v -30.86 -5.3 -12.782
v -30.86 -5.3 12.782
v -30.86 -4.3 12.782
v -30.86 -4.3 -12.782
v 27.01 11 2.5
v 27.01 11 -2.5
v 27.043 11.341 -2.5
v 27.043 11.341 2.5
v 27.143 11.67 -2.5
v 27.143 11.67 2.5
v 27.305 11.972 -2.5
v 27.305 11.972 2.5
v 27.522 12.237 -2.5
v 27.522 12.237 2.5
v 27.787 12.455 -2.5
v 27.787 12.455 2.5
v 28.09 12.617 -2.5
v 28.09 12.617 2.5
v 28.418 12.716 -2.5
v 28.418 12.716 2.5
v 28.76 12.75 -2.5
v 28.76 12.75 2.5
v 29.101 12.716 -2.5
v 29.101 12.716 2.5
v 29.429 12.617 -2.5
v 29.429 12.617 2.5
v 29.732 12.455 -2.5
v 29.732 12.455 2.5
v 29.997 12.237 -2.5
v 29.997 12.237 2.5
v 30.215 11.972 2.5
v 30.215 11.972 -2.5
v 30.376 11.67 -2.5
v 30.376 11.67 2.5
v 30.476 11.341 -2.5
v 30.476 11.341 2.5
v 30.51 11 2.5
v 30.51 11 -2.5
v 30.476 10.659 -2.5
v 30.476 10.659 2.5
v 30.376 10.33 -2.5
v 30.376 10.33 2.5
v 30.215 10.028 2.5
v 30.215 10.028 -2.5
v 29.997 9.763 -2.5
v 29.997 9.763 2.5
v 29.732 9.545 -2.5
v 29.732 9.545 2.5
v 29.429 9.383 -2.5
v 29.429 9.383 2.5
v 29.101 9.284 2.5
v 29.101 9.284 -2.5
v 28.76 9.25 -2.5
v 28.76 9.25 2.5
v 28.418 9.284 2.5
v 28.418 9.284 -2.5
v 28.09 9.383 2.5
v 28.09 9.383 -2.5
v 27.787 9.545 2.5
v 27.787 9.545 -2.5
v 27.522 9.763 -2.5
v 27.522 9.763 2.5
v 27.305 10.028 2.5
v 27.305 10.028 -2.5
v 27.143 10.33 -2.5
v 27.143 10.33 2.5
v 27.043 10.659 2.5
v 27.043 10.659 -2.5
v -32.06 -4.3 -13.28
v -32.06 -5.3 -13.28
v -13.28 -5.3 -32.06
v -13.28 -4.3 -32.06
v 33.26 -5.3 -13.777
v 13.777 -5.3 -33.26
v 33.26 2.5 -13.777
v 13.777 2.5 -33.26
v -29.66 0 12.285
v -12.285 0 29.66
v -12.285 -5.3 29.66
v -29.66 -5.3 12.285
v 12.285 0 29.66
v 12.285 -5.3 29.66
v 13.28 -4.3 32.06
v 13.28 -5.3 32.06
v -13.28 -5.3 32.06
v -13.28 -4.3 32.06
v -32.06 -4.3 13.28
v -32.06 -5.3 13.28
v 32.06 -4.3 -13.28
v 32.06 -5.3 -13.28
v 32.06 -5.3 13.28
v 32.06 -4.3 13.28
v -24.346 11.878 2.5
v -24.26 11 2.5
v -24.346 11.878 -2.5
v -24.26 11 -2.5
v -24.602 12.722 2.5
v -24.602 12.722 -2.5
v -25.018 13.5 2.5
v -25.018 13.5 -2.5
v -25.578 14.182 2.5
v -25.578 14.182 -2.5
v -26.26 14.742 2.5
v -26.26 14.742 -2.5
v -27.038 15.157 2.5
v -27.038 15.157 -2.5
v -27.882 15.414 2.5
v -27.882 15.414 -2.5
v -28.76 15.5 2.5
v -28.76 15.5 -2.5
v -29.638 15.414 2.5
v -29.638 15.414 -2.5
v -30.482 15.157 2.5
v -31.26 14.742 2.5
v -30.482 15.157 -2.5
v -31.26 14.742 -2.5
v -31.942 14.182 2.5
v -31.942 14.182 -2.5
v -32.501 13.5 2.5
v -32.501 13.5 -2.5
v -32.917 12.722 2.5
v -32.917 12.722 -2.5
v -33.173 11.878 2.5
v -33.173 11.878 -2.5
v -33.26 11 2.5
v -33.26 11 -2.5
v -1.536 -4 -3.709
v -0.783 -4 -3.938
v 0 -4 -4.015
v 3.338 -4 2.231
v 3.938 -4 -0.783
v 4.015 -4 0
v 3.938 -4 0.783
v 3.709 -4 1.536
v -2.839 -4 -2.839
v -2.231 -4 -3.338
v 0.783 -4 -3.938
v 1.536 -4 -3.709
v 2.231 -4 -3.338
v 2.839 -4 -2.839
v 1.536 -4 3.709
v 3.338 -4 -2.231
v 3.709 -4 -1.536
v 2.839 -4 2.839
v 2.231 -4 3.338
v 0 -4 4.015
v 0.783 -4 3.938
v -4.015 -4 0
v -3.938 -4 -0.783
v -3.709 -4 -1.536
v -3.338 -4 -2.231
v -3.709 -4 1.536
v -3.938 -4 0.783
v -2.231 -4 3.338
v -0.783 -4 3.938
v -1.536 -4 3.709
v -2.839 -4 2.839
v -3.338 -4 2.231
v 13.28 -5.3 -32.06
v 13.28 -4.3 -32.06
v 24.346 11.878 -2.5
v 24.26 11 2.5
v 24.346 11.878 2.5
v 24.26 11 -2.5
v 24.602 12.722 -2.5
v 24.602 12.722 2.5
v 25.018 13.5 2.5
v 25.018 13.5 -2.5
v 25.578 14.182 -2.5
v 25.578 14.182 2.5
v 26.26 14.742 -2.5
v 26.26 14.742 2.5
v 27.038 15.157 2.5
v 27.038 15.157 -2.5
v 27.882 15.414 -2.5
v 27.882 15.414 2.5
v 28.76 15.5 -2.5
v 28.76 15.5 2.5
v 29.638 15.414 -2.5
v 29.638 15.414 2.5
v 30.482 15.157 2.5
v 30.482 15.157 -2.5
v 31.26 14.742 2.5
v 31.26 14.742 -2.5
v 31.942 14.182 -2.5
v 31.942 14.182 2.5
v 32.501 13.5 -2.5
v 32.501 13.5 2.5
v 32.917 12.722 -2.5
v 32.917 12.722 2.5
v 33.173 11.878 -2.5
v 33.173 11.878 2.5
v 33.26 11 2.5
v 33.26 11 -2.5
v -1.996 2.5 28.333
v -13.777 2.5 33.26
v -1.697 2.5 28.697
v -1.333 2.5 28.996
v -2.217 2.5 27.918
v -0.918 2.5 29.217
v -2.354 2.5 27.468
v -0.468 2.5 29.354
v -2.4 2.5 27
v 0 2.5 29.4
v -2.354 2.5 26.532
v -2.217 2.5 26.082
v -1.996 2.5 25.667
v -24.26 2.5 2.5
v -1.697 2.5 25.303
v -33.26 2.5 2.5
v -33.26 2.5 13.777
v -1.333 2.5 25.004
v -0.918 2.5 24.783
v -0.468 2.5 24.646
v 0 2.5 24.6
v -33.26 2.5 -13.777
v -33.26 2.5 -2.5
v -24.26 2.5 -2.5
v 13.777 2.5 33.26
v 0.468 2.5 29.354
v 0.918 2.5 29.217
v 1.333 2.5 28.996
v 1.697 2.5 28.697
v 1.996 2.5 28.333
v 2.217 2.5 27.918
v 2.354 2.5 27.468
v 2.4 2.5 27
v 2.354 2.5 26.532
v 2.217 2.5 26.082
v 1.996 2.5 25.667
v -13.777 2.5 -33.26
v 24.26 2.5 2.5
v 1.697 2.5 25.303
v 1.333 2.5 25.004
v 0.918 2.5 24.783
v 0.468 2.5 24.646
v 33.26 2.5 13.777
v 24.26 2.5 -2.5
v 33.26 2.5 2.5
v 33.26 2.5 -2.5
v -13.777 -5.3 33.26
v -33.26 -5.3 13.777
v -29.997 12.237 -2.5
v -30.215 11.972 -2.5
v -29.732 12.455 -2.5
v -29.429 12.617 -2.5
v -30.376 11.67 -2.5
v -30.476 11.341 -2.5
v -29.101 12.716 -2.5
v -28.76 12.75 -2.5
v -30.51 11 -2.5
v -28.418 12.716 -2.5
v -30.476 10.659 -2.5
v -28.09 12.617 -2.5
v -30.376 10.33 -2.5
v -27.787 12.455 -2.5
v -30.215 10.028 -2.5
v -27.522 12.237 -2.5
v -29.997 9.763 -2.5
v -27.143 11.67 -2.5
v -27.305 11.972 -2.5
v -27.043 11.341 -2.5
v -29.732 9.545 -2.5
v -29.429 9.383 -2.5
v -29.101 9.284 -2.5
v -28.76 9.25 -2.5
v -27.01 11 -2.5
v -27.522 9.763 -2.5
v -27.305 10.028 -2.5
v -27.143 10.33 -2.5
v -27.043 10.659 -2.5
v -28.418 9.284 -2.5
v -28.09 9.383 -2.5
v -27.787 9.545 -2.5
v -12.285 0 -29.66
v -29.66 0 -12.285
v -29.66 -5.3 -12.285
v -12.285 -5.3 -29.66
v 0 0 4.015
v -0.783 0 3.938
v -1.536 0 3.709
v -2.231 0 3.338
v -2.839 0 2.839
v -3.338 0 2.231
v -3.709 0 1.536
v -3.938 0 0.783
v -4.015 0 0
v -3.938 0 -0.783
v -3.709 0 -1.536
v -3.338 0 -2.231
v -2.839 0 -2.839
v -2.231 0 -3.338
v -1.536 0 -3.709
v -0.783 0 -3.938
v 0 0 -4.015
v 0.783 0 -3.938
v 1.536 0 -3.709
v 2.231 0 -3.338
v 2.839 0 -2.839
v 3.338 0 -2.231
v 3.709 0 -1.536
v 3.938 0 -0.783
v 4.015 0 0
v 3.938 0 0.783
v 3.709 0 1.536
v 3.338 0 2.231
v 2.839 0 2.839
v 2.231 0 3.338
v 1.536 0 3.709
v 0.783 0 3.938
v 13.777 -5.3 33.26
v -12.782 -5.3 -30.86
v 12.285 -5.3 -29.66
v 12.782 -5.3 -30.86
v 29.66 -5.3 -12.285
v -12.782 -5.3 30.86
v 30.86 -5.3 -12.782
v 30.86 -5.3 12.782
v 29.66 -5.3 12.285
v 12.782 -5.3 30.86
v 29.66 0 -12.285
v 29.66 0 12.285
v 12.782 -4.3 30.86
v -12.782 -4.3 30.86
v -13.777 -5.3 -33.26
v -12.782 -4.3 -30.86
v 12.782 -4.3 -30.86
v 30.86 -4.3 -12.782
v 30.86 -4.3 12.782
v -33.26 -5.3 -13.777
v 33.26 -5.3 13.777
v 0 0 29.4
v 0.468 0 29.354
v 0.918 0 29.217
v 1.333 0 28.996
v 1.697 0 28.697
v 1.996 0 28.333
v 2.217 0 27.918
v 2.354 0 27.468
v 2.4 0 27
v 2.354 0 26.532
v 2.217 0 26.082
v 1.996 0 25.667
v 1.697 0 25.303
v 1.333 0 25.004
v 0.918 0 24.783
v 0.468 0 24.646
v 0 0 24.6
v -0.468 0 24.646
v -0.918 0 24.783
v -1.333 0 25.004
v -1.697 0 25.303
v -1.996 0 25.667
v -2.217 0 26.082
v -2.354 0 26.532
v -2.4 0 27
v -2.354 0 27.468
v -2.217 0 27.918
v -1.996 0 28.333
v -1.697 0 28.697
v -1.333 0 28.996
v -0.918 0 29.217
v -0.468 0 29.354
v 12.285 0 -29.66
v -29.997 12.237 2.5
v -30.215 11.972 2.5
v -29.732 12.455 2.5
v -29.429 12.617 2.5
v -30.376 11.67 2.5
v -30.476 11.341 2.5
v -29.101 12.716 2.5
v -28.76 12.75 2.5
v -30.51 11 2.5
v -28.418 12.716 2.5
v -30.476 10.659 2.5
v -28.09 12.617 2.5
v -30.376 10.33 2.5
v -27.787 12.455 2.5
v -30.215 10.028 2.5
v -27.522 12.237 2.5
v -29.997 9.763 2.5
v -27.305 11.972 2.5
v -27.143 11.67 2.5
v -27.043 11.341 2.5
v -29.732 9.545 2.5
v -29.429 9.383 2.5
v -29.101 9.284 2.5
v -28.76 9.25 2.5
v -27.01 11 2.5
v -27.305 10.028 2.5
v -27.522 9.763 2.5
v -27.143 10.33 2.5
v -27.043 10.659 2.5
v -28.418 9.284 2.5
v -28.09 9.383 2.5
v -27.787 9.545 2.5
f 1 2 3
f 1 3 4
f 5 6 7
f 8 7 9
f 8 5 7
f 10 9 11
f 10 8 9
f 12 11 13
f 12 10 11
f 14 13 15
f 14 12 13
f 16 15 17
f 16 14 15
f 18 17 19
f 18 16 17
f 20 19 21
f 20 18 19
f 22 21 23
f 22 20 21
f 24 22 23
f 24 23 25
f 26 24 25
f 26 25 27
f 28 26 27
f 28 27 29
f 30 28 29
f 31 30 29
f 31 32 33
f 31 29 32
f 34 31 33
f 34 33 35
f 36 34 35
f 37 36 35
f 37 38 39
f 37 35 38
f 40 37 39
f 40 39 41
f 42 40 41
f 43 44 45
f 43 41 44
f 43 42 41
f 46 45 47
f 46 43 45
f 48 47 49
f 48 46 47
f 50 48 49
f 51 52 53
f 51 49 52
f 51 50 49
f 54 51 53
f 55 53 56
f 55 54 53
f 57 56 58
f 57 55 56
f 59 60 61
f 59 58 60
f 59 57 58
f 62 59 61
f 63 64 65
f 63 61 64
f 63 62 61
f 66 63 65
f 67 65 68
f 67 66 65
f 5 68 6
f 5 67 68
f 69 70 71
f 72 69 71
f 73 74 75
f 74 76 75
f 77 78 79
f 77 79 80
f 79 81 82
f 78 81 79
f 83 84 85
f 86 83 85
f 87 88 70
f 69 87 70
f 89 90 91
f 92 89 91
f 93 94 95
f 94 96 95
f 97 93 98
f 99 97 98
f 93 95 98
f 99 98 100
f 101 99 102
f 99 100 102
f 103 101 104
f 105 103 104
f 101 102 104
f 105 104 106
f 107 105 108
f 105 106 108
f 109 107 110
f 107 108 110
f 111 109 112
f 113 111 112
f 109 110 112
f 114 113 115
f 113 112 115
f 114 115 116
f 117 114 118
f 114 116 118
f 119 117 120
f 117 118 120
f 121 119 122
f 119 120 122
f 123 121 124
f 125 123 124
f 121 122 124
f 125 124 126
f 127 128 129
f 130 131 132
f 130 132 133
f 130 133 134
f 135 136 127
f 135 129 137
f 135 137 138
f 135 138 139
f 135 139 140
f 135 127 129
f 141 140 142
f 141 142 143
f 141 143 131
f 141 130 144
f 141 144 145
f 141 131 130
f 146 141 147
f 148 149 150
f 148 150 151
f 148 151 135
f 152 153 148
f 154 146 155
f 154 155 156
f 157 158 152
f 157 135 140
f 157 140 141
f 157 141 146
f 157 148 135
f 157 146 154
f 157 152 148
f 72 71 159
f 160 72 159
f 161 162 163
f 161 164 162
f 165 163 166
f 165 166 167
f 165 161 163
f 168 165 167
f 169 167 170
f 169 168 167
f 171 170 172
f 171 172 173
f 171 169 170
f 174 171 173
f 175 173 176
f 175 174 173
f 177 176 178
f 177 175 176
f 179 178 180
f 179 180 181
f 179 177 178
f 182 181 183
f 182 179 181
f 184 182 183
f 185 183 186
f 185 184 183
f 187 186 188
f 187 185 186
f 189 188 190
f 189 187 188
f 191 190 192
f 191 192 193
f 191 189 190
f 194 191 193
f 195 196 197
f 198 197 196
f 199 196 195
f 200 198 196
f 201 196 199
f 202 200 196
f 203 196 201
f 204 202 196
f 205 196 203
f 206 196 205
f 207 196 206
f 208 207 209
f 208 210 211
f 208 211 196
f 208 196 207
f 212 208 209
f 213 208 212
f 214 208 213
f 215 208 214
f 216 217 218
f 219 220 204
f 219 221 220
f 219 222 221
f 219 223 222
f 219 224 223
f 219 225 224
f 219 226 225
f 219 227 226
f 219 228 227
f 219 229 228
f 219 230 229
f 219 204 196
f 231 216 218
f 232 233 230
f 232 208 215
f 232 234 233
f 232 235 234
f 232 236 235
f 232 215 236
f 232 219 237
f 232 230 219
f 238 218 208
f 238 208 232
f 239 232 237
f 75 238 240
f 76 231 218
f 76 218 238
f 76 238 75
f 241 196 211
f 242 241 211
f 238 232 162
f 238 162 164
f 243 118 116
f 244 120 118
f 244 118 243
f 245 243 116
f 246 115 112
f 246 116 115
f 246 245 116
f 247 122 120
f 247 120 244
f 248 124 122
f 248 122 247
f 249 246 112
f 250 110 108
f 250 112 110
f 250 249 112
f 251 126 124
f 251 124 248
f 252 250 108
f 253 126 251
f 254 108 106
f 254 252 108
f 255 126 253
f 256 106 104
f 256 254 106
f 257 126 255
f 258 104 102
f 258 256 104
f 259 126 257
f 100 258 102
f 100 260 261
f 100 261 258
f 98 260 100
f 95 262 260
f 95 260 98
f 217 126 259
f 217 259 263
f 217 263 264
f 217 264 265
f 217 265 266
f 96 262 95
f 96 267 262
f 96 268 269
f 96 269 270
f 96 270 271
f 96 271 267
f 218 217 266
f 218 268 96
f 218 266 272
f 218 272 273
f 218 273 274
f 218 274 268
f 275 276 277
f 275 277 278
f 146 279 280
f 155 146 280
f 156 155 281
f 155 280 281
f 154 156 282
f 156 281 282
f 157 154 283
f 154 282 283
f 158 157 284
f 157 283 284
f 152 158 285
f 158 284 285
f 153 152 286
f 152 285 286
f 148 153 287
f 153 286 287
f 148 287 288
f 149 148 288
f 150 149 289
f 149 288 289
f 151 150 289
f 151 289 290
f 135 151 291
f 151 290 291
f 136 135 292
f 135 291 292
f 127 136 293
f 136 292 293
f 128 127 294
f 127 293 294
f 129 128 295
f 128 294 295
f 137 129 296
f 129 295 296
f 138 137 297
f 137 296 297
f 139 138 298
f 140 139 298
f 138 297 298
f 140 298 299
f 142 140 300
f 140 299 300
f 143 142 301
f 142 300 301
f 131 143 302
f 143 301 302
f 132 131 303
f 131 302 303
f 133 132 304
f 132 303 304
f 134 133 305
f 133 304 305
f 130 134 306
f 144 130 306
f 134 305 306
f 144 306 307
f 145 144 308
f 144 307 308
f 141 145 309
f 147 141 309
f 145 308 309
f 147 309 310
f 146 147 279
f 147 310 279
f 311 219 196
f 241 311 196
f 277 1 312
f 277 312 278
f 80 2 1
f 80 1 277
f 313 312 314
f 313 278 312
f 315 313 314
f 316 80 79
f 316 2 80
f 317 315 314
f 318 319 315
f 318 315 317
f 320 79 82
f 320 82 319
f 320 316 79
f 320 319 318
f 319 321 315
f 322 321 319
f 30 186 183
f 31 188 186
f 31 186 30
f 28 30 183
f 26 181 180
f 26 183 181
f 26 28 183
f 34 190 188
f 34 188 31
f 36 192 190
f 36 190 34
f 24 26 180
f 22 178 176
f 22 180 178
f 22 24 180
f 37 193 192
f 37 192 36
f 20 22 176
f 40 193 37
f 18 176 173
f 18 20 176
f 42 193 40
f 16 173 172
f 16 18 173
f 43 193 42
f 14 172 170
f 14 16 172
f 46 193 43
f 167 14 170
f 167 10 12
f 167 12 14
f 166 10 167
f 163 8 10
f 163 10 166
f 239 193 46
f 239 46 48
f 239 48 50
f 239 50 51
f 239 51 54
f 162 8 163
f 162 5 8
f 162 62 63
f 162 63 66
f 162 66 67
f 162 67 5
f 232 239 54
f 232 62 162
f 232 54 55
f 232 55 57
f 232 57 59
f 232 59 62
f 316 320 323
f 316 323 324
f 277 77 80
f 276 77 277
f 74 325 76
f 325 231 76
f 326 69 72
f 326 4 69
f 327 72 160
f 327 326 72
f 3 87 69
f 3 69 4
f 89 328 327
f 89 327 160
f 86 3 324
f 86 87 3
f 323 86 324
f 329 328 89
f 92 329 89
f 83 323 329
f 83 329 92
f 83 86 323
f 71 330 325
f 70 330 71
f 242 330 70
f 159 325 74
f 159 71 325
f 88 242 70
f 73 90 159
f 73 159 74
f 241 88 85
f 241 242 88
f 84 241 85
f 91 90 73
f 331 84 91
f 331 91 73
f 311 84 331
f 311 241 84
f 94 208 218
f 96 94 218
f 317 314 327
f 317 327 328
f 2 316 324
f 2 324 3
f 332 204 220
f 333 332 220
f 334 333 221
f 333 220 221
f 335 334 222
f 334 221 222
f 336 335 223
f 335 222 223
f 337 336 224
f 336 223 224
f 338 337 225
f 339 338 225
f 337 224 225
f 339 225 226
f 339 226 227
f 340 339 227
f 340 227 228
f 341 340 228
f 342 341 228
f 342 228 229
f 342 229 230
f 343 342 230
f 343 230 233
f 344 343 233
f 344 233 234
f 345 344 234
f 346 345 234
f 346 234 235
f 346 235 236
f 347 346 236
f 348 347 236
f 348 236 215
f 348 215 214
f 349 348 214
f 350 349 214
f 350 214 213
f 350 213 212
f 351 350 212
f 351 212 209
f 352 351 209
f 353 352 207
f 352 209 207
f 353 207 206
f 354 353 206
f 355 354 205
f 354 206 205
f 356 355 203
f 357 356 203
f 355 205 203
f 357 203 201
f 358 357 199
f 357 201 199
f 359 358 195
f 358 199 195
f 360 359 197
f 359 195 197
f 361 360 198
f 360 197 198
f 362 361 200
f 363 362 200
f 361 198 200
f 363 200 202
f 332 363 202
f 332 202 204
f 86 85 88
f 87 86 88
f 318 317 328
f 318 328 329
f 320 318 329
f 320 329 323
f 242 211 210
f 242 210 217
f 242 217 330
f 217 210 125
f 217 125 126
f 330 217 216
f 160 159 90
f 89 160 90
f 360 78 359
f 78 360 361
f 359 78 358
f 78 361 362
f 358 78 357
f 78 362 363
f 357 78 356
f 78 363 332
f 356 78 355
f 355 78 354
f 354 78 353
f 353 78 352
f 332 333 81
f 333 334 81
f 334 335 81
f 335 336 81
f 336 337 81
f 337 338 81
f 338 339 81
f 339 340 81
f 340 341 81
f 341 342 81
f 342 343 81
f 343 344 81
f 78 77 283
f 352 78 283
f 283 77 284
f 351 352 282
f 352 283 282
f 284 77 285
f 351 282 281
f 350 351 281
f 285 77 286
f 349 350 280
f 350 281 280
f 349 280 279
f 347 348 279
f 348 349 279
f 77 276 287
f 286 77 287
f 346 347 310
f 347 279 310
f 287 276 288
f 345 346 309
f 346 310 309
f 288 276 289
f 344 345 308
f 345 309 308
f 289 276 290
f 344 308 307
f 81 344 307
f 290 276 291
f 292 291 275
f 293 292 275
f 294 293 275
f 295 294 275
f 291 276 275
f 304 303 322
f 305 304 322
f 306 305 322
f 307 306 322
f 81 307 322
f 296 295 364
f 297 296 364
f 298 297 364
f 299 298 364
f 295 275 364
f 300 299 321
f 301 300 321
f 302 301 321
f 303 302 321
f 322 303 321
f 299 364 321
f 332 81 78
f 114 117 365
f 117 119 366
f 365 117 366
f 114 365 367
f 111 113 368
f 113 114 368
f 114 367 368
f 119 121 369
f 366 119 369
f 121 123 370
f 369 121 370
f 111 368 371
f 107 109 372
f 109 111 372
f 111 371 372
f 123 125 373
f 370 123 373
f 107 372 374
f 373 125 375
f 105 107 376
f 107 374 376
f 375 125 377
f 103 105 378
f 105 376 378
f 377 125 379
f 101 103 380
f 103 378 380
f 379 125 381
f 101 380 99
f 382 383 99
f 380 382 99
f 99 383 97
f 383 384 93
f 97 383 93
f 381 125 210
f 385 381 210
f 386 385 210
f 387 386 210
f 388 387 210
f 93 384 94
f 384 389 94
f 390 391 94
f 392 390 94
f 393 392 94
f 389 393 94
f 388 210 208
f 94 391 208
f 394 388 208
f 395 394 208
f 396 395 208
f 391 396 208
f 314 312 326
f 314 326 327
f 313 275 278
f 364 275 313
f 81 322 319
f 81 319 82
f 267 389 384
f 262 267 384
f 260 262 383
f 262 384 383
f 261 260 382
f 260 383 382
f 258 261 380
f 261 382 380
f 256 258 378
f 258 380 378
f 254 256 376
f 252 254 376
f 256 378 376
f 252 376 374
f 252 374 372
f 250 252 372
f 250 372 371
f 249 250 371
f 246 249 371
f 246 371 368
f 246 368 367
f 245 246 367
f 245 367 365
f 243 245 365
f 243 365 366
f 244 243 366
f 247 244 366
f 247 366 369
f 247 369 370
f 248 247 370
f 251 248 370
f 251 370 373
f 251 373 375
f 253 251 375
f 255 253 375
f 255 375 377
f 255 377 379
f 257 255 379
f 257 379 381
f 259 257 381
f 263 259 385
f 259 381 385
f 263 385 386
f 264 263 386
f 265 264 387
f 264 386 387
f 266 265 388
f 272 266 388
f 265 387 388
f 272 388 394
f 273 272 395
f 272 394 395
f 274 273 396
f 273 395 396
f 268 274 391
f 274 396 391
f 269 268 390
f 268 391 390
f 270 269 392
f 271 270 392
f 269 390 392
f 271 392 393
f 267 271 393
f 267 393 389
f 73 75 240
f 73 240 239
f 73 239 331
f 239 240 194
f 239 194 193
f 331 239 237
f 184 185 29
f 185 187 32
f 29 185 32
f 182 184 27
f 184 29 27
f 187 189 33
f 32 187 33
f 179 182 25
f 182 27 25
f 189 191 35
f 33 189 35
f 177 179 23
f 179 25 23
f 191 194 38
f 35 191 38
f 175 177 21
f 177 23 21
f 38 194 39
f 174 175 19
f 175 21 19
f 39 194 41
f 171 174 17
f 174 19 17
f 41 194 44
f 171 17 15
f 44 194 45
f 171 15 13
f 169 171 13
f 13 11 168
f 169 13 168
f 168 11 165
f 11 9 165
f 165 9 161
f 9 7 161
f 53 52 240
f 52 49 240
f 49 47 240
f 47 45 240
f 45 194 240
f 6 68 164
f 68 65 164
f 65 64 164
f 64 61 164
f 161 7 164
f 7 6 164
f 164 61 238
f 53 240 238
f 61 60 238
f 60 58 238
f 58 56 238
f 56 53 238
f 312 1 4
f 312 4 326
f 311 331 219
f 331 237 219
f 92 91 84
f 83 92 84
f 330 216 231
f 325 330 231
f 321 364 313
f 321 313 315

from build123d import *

# Parameters (mm, degrees)
EXTRUDE_1_DEPTH     = 2.5
EXTRUDE_2_DEPTH     = 5.3
CUT_EXTRUDE_1_DEPTH = 1
SKETCH_6_R          = 4.015
EXTRUDE_4_DEPTH     = 4
SKETCH_7_R          = 2.4
CUT_EXTRUDE_3_DEPTH = 48.67861563
SKETCH_8_W          = 9
SKETCH_8_H          = 5
EXTRUDE_5_DEPTH     = 8.5
SKETCH_9_W          = 4.5
SKETCH_9_H          = 5
SKETCH_10_R         = 1.75
CUT_EXTRUDE_4_DEPTH = 52.236790534


with BuildPart() as part:
    # 스케치1 → 보스-돌출1 (new body)
    with BuildSketch(Plane(origin=(0, 0, 0), x_dir=(1, 0, 0), z_dir=(0, 1, 0))):
        Polygon((13.776603565, 33.25966317), (-13.776603565, 33.25966317), (-33.25966317, 13.776603565), (-33.25966317, -13.776603565), (-13.776603565, -33.25966317), (13.776603565, -33.25966317), (33.25966317, -13.776603565), (33.25966317, 13.776603565), align=None)
        Polygon((-13.27954729, 32.05966317), (-32.05966317, 13.27954729), (-32.05966317, -13.27954729), (-13.27954729, -32.05966317), (13.27954729, -32.05966317), (32.05966317, -13.27954729), (32.05966317, 13.27954729), (13.27954729, 32.05966317), align=None, mode=Mode.SUBTRACT)
        Polygon((13.27954729, 32.05966317), (-13.27954729, 32.05966317), (-32.05966317, 13.27954729), (-32.05966317, -13.27954729), (-13.27954729, -32.05966317), (13.27954729, -32.05966317), (32.05966317, -13.27954729), (32.05966317, 13.27954729), align=None)
    extrude(amount=EXTRUDE_1_DEPTH)

    # 스케치2 → 보스-돌출2 (add)
    with BuildSketch(Plane.XZ):
        Polygon((-33.25966317, -13.776603565), (-13.776603565, -33.25966317), (13.776603565, -33.25966317), (33.25966317, -13.776603565), (33.25966317, 13.776603565), (13.776603565, 33.25966317), (-13.776603565, 33.25966317), (-33.25966317, 13.776603565), align=None)
        Polygon((-32.05966317, -13.27954729), (-13.27954729, -32.05966317), (13.27954729, -32.05966317), (32.05966317, -13.27954729), (32.05966317, 13.27954729), (13.27954729, 32.05966317), (-13.27954729, 32.05966317), (-32.05966317, 13.27954729), align=None, mode=Mode.SUBTRACT)
        Polygon((-32.05966317, 13.27954729), (-32.05966317, -13.27954729), (-13.27954729, -32.05966317), (13.27954729, -32.05966317), (32.05966317, -13.27954729), (32.05966317, 13.27954729), (13.27954729, 32.05966317), (-13.27954729, 32.05966317), align=None)
        Polygon((-30.85966317, -12.782491015), (-12.782491015, -30.85966317), (12.782491015, -30.85966317), (30.85966317, -12.782491015), (30.85966317, 12.782491015), (12.782491015, 30.85966317), (-12.782491015, 30.85966317), (-30.85966317, 12.782491015), align=None, mode=Mode.SUBTRACT)
        Polygon((-30.85966317, 12.782491015), (-30.85966317, -12.782491015), (-12.782491015, -30.85966317), (12.782491015, -30.85966317), (30.85966317, -12.782491015), (30.85966317, 12.782491015), (12.782491015, 30.85966317), (-12.782491015, 30.85966317), align=None)
        Polygon((-29.65966317, -12.285434741), (-12.285434741, -29.65966317), (12.285434741, -29.65966317), (29.65966317, -12.285434741), (29.65966317, 12.285434741), (12.285434741, 29.65966317), (-12.285434741, 29.65966317), (-29.65966317, 12.285434741), align=None, mode=Mode.SUBTRACT)
    extrude(amount=EXTRUDE_2_DEPTH)

    # 스케치3 → 컷-돌출1 (cut)
    with BuildSketch(Plane.XZ.offset(5.3)):
        Polygon((-32.05966317, -13.27954729), (-13.27954729, -32.05966317), (13.27954729, -32.05966317), (32.05966317, -13.27954729), (32.05966317, 13.27954729), (13.27954729, 32.05966317), (-13.27954729, 32.05966317), (-32.05966317, 13.27954729), align=None)
        Polygon((-30.85966317, -12.782491015), (-12.782491015, -30.85966317), (12.782491015, -30.85966317), (30.85966317, -12.782491015), (30.85966317, 12.782491015), (12.782491015, 30.85966317), (-12.782491015, 30.85966317), (-30.85966317, 12.782491015), align=None, mode=Mode.SUBTRACT)
    extrude(amount=-CUT_EXTRUDE_1_DEPTH, mode=Mode.SUBTRACT)

    # 스케치6 → 보스-돌출4 (add)
    with BuildSketch(Plane.XZ):
        with Locations(Location((0, 0, 0), (0, 0, 90))):
            Circle(SKETCH_6_R)
    extrude(amount=EXTRUDE_4_DEPTH)

    # 스케치7 → 컷-돌출3 (cut, through all)
    with BuildSketch(Plane(origin=(0, 2.5, 0), x_dir=(1, 0, 0), z_dir=(0, 1, 0))):
        with Locations(Location((0, -27, 0), (0, 0, 270))):
            Circle(SKETCH_7_R)
    extrude(amount=-CUT_EXTRUDE_3_DEPTH, mode=Mode.SUBTRACT)

    # 스케치8 → 보스-돌출5 (add)
    with BuildSketch(Plane(origin=(0, 2.5, 0), x_dir=(1, 0, 0), z_dir=(0, 1, 0))):
        with Locations((-28.75966317, 0)):
            Rectangle(SKETCH_8_W, SKETCH_8_H)
    extrude_5 = extrude(amount=EXTRUDE_5_DEPTH)

    # 스케치9 → 회전1 (revolve)
    with BuildSketch(Plane(origin=(0, 11, 0), x_dir=(1, 0, 0), z_dir=(0, 1, 0))):
        with Locations((-31.00966317, 0)):
            Rectangle(SKETCH_9_W, SKETCH_9_H)
    revolve_1 = revolve(axis=Axis((-28.75966317, 11, -5.508751215), (0, 0, 1)))

    # 스케치10 → 컷-돌출4 (cut, through all)
    with BuildSketch(Plane.XY.offset(2.5)):
        with Locations((-28.75966317, 11)):
            Circle(SKETCH_10_R)
    cut_extrude_4 = extrude(amount=-CUT_EXTRUDE_4_DEPTH, mode=Mode.SUBTRACT)

    # 대칭 복사1: 보스-돌출5, 회전1, 컷-돌출4 across plane
    add(extrude_5.mirror(Plane(origin=(0, 0, 0), x_dir=(0, 0, 1), z_dir=(1, 0, 0))))
    add(revolve_1.mirror(Plane(origin=(0, 0, 0), x_dir=(0, 0, 1), z_dir=(1, 0, 0))))
    add(cut_extrude_4.mirror(Plane(origin=(0, 0, 0), x_dir=(0, 0, 1), z_dir=(1, 0, 0))), mode=Mode.SUBTRACT)


solid = part.part
